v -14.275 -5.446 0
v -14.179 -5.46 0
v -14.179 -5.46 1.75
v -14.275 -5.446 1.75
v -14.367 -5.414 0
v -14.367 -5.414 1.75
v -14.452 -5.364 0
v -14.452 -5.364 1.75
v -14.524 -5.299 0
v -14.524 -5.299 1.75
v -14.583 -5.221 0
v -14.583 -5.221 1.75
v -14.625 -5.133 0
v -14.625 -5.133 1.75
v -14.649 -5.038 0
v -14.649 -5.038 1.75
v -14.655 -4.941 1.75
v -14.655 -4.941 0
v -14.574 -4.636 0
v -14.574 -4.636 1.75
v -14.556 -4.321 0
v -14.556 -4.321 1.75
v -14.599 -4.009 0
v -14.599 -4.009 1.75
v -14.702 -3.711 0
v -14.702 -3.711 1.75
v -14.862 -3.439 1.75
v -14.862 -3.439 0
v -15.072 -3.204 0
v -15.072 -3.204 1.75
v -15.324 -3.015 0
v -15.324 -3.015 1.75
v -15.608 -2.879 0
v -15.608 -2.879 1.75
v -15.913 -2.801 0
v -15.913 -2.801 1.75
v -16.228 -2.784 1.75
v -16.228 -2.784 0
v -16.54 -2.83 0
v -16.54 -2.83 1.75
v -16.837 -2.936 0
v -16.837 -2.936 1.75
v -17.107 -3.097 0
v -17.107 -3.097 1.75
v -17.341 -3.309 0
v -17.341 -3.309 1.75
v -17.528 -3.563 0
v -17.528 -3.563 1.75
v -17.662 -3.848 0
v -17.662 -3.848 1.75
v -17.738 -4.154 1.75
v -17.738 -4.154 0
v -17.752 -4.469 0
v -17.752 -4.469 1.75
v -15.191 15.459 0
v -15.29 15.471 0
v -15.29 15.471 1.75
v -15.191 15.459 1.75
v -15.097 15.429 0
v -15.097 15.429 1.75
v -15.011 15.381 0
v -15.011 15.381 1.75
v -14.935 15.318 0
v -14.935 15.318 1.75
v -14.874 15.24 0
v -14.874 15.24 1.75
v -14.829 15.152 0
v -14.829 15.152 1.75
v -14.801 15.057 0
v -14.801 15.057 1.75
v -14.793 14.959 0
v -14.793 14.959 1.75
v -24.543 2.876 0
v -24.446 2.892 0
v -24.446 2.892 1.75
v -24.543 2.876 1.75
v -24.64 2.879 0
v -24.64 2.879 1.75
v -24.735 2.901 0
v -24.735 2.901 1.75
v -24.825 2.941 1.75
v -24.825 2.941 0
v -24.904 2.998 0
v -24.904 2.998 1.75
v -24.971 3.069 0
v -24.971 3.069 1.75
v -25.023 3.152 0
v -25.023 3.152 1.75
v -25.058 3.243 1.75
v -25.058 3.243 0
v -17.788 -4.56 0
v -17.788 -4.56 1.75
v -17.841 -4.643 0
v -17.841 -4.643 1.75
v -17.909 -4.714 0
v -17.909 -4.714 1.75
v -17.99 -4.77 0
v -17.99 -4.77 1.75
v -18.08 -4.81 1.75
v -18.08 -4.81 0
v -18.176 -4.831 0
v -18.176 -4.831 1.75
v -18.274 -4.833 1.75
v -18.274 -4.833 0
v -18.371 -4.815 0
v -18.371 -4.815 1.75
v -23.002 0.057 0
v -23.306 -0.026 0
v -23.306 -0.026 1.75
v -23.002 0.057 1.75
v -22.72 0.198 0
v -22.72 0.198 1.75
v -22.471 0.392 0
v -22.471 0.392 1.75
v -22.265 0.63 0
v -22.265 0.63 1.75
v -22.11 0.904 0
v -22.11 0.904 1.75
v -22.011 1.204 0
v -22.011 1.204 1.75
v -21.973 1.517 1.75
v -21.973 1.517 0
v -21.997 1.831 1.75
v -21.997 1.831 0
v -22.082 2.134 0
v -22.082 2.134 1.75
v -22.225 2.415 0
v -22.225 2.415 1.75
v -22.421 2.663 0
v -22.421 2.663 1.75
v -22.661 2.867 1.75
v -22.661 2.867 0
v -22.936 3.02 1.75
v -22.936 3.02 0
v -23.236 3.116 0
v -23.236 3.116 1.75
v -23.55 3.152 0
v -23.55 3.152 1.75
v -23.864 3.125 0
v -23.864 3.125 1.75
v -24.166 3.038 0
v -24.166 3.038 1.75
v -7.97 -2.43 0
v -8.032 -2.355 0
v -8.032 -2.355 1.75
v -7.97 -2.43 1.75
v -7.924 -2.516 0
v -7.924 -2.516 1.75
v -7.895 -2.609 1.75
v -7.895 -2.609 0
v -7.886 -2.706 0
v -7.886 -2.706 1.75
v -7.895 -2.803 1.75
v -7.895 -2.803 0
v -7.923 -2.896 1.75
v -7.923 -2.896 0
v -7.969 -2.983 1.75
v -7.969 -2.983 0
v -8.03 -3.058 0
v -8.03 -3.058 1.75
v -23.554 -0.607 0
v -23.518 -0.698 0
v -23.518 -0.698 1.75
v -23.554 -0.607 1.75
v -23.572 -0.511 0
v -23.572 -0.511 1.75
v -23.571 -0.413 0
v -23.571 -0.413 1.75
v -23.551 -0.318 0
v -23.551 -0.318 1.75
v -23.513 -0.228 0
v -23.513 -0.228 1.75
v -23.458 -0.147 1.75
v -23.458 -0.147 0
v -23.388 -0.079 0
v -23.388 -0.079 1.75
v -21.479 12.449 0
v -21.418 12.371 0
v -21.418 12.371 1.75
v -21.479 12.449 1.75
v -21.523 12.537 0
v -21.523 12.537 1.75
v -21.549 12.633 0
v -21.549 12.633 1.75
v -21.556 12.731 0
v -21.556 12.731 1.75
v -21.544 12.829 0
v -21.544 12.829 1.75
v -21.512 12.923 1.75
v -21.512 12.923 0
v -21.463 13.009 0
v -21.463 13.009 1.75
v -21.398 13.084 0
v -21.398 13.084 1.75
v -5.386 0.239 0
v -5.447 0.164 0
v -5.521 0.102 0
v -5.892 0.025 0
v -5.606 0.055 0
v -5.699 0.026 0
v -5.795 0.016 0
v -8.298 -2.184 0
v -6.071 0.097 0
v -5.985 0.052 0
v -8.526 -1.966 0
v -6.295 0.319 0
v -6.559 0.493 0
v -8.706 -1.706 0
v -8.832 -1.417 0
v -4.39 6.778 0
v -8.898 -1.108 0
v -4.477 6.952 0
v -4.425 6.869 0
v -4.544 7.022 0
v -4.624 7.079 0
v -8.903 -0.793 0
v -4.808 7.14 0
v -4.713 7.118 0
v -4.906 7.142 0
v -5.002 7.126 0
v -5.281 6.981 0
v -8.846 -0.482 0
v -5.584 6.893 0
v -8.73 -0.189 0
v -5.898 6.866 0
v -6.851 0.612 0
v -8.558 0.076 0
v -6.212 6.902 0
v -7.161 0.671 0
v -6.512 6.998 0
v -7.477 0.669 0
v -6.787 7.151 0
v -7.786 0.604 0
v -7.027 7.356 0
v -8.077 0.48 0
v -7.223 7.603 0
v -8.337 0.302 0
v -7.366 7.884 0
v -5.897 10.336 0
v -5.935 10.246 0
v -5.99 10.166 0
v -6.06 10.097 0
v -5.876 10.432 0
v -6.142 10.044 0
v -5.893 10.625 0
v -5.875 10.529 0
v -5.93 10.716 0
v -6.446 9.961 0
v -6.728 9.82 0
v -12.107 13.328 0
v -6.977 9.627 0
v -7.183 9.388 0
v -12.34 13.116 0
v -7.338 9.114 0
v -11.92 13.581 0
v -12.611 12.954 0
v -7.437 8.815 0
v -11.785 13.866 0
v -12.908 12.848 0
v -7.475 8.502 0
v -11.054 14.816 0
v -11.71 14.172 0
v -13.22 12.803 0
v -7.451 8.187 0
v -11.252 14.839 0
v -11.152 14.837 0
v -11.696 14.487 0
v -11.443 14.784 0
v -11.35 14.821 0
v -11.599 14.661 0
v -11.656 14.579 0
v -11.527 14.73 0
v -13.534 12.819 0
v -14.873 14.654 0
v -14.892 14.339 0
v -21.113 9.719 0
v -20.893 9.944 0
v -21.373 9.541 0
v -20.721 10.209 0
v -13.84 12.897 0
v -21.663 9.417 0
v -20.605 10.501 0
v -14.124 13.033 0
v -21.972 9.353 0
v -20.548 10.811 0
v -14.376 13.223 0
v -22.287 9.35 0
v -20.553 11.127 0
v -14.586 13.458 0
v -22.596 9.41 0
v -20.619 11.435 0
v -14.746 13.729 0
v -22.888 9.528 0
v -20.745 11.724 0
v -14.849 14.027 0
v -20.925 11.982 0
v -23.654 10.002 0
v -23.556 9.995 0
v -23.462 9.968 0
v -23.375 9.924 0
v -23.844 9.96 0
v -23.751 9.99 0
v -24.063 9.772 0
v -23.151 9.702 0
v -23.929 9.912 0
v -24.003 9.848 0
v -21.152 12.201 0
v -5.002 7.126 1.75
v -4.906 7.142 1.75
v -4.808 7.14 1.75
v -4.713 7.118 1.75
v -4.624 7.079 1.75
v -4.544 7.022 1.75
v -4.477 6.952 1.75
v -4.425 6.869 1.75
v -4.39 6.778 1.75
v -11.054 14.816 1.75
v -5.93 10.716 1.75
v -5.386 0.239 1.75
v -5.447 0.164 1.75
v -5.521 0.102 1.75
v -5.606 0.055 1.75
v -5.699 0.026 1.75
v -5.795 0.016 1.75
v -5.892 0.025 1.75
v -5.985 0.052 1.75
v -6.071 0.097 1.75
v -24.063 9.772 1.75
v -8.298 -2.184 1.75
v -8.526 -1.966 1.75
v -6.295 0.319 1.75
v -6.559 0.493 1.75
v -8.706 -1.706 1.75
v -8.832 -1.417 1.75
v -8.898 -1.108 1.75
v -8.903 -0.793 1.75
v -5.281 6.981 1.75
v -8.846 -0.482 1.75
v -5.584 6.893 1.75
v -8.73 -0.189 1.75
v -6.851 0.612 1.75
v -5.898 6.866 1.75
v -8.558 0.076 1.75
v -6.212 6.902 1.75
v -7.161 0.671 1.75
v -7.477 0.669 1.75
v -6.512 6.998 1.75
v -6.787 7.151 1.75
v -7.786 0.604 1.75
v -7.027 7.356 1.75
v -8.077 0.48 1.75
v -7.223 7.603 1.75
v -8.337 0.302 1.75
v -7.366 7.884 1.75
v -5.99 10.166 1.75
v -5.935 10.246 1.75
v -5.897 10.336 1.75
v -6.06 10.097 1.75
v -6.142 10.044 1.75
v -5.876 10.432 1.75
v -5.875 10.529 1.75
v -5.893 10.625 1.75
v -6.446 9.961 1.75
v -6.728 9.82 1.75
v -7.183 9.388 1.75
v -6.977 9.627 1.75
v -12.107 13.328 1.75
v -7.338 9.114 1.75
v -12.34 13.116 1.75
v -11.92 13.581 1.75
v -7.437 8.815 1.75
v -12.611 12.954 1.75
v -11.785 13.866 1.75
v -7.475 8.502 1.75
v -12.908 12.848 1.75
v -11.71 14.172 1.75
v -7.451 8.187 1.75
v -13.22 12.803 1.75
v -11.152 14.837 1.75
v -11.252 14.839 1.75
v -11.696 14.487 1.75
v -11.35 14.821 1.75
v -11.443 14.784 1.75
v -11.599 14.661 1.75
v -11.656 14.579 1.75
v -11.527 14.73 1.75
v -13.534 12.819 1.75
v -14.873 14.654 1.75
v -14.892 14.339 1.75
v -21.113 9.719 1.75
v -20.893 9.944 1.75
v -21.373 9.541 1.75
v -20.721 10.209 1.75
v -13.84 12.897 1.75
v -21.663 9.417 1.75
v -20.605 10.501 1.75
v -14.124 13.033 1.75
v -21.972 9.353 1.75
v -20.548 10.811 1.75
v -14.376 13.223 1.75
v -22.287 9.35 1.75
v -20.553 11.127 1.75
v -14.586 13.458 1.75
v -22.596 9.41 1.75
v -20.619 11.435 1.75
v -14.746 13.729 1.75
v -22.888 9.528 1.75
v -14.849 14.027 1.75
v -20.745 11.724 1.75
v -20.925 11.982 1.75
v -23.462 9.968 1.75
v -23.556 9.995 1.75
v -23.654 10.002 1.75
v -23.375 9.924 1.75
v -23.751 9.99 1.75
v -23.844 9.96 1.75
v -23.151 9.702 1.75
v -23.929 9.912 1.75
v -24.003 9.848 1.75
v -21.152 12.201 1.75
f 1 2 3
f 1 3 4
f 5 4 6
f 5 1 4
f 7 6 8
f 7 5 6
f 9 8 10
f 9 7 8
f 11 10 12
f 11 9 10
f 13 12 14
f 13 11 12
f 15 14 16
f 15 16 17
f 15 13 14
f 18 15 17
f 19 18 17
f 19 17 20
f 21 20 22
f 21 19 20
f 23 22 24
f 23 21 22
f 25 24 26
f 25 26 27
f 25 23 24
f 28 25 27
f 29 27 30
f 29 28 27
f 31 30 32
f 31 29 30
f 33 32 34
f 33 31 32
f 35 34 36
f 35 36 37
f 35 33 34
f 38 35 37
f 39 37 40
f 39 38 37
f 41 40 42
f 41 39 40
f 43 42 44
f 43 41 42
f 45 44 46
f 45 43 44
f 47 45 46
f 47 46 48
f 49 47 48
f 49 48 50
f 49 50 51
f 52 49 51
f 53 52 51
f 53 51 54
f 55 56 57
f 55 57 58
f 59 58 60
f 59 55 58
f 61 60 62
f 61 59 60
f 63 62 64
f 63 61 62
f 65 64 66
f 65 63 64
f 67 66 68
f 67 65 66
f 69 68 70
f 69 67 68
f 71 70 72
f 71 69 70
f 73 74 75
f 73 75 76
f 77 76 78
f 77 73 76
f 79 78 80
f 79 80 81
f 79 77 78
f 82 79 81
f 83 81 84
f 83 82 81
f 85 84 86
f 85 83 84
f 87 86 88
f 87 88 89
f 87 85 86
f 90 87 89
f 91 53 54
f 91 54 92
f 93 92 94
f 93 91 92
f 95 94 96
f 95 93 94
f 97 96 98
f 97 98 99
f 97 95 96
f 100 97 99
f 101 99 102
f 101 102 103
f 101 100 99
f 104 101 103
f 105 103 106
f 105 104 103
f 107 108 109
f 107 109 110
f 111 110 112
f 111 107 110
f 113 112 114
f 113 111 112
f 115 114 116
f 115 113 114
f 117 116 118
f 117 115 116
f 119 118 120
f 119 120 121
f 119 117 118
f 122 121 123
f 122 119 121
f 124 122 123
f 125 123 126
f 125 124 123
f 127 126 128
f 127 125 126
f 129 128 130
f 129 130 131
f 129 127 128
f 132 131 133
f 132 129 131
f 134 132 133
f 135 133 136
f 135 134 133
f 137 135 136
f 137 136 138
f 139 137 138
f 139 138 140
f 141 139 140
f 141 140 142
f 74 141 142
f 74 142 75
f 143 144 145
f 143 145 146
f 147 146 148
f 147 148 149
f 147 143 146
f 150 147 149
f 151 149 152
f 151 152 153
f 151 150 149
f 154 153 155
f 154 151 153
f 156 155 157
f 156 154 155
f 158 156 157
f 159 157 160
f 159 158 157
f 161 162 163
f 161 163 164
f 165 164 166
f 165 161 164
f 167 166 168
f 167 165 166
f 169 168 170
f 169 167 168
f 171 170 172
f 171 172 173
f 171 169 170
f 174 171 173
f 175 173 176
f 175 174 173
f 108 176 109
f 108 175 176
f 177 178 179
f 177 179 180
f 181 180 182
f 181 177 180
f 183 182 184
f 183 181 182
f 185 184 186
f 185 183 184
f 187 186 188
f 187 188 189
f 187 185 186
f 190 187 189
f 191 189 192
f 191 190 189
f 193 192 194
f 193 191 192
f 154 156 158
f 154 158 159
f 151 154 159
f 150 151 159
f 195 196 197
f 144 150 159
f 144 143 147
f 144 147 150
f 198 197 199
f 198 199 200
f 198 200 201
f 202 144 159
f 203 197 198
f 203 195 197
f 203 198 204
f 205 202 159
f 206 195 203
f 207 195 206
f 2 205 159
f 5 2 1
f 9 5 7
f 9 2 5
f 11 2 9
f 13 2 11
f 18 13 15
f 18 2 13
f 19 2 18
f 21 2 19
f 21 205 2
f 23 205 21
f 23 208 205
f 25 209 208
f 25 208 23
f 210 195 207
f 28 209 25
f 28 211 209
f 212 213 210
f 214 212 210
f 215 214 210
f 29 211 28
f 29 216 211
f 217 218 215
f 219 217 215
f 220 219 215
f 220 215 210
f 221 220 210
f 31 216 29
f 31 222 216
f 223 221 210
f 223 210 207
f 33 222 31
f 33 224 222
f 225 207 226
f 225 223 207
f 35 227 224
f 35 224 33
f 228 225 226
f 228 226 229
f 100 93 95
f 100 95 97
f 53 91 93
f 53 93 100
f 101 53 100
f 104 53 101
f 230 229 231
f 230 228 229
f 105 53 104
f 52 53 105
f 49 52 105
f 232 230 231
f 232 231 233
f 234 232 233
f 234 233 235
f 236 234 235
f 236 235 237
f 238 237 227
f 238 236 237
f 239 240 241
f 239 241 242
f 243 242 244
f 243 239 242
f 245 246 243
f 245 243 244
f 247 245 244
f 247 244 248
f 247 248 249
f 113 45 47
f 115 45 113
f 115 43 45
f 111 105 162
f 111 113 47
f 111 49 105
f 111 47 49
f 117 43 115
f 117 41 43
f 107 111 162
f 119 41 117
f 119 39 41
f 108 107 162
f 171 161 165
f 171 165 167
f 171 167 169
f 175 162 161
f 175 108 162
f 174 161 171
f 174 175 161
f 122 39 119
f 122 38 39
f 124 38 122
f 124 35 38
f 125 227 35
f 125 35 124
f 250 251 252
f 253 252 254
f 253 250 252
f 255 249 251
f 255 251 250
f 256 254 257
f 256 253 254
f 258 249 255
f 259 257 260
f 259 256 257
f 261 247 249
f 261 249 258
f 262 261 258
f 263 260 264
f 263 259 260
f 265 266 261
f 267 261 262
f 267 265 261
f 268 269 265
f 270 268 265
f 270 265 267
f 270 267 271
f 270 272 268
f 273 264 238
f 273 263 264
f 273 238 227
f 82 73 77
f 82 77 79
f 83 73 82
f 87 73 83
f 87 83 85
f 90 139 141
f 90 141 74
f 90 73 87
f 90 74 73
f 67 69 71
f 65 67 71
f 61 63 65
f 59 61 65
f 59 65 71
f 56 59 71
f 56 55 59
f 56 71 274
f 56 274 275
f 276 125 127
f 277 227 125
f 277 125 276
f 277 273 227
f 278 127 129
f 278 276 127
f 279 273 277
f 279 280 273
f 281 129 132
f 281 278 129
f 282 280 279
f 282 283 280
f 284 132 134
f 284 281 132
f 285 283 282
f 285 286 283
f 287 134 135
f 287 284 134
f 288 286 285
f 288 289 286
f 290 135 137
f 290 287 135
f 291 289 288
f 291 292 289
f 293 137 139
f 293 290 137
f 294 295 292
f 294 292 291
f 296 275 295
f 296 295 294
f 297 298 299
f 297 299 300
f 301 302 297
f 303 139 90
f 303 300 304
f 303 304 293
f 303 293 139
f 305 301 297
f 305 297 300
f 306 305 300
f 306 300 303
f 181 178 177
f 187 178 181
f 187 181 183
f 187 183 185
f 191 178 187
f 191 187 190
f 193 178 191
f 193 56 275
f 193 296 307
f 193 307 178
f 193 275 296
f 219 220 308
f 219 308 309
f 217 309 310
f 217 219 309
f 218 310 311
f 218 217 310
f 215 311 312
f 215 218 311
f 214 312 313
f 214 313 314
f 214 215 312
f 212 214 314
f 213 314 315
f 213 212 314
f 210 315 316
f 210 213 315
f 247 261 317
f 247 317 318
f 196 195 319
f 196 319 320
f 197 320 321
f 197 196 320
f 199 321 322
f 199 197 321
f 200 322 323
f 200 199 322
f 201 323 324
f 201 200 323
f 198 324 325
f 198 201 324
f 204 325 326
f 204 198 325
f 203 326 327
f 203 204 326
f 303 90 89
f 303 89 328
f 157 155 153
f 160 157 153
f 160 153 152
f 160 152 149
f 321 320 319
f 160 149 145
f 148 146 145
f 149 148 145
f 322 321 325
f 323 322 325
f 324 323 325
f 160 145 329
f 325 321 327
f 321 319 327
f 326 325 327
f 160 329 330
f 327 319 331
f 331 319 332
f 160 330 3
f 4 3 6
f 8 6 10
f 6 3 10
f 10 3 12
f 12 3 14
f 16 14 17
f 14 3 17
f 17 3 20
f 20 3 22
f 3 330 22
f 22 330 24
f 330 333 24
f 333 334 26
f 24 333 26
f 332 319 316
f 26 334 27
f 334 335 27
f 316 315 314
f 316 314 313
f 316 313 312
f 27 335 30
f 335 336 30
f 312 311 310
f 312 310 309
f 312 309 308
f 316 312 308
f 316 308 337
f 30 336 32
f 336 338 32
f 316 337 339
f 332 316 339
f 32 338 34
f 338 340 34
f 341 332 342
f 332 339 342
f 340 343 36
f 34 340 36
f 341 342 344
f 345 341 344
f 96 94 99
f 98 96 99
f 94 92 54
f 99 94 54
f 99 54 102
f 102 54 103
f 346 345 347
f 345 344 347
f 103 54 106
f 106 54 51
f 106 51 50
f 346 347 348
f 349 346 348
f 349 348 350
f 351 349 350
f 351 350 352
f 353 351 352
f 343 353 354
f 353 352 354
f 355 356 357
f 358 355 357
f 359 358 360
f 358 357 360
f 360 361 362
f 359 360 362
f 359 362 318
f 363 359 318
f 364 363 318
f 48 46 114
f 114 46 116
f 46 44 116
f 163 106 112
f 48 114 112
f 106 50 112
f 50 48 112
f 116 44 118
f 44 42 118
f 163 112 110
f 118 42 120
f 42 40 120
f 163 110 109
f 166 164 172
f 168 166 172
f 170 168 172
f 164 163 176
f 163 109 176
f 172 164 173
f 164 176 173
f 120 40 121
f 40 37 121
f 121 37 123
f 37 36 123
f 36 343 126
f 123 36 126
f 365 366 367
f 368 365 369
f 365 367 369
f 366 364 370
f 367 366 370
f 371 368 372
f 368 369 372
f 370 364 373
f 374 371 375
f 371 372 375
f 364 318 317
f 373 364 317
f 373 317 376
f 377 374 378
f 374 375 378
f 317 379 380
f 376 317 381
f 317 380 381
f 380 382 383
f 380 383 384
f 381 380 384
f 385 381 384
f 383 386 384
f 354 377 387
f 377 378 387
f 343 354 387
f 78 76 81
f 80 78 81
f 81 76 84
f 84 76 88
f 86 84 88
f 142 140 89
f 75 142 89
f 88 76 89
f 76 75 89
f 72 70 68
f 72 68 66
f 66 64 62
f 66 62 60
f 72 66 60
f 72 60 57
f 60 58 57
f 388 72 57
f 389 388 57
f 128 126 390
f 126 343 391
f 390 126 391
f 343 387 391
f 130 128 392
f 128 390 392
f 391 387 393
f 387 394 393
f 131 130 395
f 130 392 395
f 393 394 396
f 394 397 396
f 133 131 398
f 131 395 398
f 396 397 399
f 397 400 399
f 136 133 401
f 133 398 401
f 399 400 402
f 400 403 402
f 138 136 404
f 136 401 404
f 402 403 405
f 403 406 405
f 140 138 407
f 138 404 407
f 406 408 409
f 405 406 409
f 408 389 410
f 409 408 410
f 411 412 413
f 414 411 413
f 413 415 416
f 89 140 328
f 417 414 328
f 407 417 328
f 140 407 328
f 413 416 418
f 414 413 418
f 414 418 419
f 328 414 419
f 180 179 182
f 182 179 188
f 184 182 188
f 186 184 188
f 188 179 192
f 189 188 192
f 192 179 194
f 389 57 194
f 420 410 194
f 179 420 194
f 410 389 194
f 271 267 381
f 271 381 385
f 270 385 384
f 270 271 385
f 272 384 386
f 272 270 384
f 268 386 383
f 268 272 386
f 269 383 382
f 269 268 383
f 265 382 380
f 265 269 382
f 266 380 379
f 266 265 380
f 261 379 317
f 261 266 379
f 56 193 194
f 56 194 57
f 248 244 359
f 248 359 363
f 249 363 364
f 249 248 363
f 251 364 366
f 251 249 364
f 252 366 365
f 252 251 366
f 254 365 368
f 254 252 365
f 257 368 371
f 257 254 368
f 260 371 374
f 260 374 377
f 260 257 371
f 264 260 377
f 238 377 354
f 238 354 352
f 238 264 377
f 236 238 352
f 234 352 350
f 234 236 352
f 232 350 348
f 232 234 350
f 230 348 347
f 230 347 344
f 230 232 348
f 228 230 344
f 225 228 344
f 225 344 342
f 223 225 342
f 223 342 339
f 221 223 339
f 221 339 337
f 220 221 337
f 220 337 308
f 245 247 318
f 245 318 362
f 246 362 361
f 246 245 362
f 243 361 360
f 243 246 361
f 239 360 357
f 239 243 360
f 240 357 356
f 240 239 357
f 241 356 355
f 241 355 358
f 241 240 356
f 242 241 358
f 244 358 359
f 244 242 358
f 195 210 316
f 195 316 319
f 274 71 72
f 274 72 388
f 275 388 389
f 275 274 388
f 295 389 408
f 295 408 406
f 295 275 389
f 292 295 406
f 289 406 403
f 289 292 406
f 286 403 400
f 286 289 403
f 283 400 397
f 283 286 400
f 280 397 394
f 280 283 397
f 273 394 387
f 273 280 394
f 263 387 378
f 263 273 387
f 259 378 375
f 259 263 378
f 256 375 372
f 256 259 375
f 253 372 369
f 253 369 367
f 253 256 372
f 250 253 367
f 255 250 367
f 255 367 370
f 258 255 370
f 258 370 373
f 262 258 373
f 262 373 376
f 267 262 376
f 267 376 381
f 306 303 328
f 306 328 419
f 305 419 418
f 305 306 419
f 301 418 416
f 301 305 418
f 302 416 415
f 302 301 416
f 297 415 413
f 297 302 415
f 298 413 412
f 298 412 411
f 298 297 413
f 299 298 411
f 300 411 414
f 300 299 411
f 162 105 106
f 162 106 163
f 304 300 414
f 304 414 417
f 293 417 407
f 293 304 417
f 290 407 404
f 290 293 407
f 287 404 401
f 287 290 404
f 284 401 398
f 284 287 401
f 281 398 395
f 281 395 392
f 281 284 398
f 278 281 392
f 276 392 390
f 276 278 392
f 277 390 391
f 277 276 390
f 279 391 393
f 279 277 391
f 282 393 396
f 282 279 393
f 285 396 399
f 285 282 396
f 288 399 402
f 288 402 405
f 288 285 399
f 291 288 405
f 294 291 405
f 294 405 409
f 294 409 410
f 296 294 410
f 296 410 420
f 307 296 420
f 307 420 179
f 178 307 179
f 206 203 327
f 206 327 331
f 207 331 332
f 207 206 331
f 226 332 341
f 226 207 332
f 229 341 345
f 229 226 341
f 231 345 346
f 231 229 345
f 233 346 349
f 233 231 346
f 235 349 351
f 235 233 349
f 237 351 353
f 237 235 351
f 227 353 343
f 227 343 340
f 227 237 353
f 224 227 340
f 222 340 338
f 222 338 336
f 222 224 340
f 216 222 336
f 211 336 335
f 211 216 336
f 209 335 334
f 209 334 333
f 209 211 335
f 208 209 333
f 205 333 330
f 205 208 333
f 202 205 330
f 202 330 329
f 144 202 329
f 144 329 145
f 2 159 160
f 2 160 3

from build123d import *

# Parameters (mm, degrees)
P_IDAT_VYSUNUT_M1_DEPTH = 1.75


with BuildPart() as part:
    # Skica1 → Přidat vysunutím1 (new body)
    with BuildSketch(Plane.XY):
        with BuildLine():
            ThreePointArc((-23.51800991, -0.697818184), (-23.551279529, -0.317829699), (-23.306112267, -0.025612092))
            ThreePointArc((-23.306112267, -0.025612092), (-22.082279375, 2.134290781), (-24.446191601, 2.8924902))
            ThreePointArc((-24.446191601, 2.8924902), (-24.824522171, 2.941112168), (-25.057661359, 3.243013203))
            Line((-25.057661359, 3.243013203), (-24.063340681, 9.771553438))
            ThreePointArc((-24.063340681, 9.771553438), (-23.75089581, 9.990360015), (-23.375244308, 9.924147742))
            ThreePointArc((-23.375244308, 9.924147742), (-20.892797104, 9.944228804), (-21.418133259, 12.370536553))
            ThreePointArc((-21.418133259, 12.370536553), (-21.555999835, 12.731317514), (-21.398375562, 13.083914568))
            Line((-21.398375562, 13.083914568), (-15.289598715, 15.470565049))
            ThreePointArc((-15.289598715, 15.470565049), (-14.935362368, 15.317566791), (-14.79306555, 14.958897763))
            ThreePointArc((-14.79306555, 14.958897763), (-13.534451239, 12.819075952), (-11.695875168, 14.487184282))
            ThreePointArc((-11.695875168, 14.487184282), (-11.443098415, 14.784286161), (-11.054275505, 14.815628758))
            Line((-11.054275505, 14.815628758), (-5.929857109, 10.716094041))
            ThreePointArc((-5.929857109, 10.716094041), (-5.896587491, 10.336105556), (-6.141754752, 10.043887949))
            ThreePointArc((-6.141754752, 10.043887949), (-7.365587644, 7.883985076), (-5.001675418, 7.125785657))
            ThreePointArc((-5.001675418, 7.125785657), (-4.623928538, 7.078562418), (-4.389720717, 6.778446712))
            Line((-4.389720717, 6.778446712), (-5.385684859, 0.239115766))
            ThreePointArc((-5.385684859, 0.239115766), (-5.698895503, 0.026203976), (-6.070920244, 0.097125976))
            ThreePointArc((-6.070920244, 0.097125976), (-8.557586552, 0.076060362), (-8.03228479, -2.354579707))
            ThreePointArc((-8.03228479, -2.354579707), (-7.885616036, -2.705983653), (-8.030385679, -3.058174236))
            Line((-8.030385679, -3.058174236), (-14.178602738, -5.460233693))
            ThreePointArc((-14.178602738, -5.460233693), (-14.524317228, -5.299051786), (-14.654801469, -4.940621906))
            ThreePointArc((-14.654801469, -4.940621906), (-15.913415781, -2.800800095), (-17.751991851, -4.468908425))
            ThreePointArc((-17.751991851, -4.468908425), (-17.989793399, -4.770349614), (-18.371095594, -4.815349636))
            Line((-18.371095594, -4.815349636), (-23.51800991, -0.697818184))
        make_face()
    extrude(amount=P_IDAT_VYSUNUT_M1_DEPTH)


solid = part.part
